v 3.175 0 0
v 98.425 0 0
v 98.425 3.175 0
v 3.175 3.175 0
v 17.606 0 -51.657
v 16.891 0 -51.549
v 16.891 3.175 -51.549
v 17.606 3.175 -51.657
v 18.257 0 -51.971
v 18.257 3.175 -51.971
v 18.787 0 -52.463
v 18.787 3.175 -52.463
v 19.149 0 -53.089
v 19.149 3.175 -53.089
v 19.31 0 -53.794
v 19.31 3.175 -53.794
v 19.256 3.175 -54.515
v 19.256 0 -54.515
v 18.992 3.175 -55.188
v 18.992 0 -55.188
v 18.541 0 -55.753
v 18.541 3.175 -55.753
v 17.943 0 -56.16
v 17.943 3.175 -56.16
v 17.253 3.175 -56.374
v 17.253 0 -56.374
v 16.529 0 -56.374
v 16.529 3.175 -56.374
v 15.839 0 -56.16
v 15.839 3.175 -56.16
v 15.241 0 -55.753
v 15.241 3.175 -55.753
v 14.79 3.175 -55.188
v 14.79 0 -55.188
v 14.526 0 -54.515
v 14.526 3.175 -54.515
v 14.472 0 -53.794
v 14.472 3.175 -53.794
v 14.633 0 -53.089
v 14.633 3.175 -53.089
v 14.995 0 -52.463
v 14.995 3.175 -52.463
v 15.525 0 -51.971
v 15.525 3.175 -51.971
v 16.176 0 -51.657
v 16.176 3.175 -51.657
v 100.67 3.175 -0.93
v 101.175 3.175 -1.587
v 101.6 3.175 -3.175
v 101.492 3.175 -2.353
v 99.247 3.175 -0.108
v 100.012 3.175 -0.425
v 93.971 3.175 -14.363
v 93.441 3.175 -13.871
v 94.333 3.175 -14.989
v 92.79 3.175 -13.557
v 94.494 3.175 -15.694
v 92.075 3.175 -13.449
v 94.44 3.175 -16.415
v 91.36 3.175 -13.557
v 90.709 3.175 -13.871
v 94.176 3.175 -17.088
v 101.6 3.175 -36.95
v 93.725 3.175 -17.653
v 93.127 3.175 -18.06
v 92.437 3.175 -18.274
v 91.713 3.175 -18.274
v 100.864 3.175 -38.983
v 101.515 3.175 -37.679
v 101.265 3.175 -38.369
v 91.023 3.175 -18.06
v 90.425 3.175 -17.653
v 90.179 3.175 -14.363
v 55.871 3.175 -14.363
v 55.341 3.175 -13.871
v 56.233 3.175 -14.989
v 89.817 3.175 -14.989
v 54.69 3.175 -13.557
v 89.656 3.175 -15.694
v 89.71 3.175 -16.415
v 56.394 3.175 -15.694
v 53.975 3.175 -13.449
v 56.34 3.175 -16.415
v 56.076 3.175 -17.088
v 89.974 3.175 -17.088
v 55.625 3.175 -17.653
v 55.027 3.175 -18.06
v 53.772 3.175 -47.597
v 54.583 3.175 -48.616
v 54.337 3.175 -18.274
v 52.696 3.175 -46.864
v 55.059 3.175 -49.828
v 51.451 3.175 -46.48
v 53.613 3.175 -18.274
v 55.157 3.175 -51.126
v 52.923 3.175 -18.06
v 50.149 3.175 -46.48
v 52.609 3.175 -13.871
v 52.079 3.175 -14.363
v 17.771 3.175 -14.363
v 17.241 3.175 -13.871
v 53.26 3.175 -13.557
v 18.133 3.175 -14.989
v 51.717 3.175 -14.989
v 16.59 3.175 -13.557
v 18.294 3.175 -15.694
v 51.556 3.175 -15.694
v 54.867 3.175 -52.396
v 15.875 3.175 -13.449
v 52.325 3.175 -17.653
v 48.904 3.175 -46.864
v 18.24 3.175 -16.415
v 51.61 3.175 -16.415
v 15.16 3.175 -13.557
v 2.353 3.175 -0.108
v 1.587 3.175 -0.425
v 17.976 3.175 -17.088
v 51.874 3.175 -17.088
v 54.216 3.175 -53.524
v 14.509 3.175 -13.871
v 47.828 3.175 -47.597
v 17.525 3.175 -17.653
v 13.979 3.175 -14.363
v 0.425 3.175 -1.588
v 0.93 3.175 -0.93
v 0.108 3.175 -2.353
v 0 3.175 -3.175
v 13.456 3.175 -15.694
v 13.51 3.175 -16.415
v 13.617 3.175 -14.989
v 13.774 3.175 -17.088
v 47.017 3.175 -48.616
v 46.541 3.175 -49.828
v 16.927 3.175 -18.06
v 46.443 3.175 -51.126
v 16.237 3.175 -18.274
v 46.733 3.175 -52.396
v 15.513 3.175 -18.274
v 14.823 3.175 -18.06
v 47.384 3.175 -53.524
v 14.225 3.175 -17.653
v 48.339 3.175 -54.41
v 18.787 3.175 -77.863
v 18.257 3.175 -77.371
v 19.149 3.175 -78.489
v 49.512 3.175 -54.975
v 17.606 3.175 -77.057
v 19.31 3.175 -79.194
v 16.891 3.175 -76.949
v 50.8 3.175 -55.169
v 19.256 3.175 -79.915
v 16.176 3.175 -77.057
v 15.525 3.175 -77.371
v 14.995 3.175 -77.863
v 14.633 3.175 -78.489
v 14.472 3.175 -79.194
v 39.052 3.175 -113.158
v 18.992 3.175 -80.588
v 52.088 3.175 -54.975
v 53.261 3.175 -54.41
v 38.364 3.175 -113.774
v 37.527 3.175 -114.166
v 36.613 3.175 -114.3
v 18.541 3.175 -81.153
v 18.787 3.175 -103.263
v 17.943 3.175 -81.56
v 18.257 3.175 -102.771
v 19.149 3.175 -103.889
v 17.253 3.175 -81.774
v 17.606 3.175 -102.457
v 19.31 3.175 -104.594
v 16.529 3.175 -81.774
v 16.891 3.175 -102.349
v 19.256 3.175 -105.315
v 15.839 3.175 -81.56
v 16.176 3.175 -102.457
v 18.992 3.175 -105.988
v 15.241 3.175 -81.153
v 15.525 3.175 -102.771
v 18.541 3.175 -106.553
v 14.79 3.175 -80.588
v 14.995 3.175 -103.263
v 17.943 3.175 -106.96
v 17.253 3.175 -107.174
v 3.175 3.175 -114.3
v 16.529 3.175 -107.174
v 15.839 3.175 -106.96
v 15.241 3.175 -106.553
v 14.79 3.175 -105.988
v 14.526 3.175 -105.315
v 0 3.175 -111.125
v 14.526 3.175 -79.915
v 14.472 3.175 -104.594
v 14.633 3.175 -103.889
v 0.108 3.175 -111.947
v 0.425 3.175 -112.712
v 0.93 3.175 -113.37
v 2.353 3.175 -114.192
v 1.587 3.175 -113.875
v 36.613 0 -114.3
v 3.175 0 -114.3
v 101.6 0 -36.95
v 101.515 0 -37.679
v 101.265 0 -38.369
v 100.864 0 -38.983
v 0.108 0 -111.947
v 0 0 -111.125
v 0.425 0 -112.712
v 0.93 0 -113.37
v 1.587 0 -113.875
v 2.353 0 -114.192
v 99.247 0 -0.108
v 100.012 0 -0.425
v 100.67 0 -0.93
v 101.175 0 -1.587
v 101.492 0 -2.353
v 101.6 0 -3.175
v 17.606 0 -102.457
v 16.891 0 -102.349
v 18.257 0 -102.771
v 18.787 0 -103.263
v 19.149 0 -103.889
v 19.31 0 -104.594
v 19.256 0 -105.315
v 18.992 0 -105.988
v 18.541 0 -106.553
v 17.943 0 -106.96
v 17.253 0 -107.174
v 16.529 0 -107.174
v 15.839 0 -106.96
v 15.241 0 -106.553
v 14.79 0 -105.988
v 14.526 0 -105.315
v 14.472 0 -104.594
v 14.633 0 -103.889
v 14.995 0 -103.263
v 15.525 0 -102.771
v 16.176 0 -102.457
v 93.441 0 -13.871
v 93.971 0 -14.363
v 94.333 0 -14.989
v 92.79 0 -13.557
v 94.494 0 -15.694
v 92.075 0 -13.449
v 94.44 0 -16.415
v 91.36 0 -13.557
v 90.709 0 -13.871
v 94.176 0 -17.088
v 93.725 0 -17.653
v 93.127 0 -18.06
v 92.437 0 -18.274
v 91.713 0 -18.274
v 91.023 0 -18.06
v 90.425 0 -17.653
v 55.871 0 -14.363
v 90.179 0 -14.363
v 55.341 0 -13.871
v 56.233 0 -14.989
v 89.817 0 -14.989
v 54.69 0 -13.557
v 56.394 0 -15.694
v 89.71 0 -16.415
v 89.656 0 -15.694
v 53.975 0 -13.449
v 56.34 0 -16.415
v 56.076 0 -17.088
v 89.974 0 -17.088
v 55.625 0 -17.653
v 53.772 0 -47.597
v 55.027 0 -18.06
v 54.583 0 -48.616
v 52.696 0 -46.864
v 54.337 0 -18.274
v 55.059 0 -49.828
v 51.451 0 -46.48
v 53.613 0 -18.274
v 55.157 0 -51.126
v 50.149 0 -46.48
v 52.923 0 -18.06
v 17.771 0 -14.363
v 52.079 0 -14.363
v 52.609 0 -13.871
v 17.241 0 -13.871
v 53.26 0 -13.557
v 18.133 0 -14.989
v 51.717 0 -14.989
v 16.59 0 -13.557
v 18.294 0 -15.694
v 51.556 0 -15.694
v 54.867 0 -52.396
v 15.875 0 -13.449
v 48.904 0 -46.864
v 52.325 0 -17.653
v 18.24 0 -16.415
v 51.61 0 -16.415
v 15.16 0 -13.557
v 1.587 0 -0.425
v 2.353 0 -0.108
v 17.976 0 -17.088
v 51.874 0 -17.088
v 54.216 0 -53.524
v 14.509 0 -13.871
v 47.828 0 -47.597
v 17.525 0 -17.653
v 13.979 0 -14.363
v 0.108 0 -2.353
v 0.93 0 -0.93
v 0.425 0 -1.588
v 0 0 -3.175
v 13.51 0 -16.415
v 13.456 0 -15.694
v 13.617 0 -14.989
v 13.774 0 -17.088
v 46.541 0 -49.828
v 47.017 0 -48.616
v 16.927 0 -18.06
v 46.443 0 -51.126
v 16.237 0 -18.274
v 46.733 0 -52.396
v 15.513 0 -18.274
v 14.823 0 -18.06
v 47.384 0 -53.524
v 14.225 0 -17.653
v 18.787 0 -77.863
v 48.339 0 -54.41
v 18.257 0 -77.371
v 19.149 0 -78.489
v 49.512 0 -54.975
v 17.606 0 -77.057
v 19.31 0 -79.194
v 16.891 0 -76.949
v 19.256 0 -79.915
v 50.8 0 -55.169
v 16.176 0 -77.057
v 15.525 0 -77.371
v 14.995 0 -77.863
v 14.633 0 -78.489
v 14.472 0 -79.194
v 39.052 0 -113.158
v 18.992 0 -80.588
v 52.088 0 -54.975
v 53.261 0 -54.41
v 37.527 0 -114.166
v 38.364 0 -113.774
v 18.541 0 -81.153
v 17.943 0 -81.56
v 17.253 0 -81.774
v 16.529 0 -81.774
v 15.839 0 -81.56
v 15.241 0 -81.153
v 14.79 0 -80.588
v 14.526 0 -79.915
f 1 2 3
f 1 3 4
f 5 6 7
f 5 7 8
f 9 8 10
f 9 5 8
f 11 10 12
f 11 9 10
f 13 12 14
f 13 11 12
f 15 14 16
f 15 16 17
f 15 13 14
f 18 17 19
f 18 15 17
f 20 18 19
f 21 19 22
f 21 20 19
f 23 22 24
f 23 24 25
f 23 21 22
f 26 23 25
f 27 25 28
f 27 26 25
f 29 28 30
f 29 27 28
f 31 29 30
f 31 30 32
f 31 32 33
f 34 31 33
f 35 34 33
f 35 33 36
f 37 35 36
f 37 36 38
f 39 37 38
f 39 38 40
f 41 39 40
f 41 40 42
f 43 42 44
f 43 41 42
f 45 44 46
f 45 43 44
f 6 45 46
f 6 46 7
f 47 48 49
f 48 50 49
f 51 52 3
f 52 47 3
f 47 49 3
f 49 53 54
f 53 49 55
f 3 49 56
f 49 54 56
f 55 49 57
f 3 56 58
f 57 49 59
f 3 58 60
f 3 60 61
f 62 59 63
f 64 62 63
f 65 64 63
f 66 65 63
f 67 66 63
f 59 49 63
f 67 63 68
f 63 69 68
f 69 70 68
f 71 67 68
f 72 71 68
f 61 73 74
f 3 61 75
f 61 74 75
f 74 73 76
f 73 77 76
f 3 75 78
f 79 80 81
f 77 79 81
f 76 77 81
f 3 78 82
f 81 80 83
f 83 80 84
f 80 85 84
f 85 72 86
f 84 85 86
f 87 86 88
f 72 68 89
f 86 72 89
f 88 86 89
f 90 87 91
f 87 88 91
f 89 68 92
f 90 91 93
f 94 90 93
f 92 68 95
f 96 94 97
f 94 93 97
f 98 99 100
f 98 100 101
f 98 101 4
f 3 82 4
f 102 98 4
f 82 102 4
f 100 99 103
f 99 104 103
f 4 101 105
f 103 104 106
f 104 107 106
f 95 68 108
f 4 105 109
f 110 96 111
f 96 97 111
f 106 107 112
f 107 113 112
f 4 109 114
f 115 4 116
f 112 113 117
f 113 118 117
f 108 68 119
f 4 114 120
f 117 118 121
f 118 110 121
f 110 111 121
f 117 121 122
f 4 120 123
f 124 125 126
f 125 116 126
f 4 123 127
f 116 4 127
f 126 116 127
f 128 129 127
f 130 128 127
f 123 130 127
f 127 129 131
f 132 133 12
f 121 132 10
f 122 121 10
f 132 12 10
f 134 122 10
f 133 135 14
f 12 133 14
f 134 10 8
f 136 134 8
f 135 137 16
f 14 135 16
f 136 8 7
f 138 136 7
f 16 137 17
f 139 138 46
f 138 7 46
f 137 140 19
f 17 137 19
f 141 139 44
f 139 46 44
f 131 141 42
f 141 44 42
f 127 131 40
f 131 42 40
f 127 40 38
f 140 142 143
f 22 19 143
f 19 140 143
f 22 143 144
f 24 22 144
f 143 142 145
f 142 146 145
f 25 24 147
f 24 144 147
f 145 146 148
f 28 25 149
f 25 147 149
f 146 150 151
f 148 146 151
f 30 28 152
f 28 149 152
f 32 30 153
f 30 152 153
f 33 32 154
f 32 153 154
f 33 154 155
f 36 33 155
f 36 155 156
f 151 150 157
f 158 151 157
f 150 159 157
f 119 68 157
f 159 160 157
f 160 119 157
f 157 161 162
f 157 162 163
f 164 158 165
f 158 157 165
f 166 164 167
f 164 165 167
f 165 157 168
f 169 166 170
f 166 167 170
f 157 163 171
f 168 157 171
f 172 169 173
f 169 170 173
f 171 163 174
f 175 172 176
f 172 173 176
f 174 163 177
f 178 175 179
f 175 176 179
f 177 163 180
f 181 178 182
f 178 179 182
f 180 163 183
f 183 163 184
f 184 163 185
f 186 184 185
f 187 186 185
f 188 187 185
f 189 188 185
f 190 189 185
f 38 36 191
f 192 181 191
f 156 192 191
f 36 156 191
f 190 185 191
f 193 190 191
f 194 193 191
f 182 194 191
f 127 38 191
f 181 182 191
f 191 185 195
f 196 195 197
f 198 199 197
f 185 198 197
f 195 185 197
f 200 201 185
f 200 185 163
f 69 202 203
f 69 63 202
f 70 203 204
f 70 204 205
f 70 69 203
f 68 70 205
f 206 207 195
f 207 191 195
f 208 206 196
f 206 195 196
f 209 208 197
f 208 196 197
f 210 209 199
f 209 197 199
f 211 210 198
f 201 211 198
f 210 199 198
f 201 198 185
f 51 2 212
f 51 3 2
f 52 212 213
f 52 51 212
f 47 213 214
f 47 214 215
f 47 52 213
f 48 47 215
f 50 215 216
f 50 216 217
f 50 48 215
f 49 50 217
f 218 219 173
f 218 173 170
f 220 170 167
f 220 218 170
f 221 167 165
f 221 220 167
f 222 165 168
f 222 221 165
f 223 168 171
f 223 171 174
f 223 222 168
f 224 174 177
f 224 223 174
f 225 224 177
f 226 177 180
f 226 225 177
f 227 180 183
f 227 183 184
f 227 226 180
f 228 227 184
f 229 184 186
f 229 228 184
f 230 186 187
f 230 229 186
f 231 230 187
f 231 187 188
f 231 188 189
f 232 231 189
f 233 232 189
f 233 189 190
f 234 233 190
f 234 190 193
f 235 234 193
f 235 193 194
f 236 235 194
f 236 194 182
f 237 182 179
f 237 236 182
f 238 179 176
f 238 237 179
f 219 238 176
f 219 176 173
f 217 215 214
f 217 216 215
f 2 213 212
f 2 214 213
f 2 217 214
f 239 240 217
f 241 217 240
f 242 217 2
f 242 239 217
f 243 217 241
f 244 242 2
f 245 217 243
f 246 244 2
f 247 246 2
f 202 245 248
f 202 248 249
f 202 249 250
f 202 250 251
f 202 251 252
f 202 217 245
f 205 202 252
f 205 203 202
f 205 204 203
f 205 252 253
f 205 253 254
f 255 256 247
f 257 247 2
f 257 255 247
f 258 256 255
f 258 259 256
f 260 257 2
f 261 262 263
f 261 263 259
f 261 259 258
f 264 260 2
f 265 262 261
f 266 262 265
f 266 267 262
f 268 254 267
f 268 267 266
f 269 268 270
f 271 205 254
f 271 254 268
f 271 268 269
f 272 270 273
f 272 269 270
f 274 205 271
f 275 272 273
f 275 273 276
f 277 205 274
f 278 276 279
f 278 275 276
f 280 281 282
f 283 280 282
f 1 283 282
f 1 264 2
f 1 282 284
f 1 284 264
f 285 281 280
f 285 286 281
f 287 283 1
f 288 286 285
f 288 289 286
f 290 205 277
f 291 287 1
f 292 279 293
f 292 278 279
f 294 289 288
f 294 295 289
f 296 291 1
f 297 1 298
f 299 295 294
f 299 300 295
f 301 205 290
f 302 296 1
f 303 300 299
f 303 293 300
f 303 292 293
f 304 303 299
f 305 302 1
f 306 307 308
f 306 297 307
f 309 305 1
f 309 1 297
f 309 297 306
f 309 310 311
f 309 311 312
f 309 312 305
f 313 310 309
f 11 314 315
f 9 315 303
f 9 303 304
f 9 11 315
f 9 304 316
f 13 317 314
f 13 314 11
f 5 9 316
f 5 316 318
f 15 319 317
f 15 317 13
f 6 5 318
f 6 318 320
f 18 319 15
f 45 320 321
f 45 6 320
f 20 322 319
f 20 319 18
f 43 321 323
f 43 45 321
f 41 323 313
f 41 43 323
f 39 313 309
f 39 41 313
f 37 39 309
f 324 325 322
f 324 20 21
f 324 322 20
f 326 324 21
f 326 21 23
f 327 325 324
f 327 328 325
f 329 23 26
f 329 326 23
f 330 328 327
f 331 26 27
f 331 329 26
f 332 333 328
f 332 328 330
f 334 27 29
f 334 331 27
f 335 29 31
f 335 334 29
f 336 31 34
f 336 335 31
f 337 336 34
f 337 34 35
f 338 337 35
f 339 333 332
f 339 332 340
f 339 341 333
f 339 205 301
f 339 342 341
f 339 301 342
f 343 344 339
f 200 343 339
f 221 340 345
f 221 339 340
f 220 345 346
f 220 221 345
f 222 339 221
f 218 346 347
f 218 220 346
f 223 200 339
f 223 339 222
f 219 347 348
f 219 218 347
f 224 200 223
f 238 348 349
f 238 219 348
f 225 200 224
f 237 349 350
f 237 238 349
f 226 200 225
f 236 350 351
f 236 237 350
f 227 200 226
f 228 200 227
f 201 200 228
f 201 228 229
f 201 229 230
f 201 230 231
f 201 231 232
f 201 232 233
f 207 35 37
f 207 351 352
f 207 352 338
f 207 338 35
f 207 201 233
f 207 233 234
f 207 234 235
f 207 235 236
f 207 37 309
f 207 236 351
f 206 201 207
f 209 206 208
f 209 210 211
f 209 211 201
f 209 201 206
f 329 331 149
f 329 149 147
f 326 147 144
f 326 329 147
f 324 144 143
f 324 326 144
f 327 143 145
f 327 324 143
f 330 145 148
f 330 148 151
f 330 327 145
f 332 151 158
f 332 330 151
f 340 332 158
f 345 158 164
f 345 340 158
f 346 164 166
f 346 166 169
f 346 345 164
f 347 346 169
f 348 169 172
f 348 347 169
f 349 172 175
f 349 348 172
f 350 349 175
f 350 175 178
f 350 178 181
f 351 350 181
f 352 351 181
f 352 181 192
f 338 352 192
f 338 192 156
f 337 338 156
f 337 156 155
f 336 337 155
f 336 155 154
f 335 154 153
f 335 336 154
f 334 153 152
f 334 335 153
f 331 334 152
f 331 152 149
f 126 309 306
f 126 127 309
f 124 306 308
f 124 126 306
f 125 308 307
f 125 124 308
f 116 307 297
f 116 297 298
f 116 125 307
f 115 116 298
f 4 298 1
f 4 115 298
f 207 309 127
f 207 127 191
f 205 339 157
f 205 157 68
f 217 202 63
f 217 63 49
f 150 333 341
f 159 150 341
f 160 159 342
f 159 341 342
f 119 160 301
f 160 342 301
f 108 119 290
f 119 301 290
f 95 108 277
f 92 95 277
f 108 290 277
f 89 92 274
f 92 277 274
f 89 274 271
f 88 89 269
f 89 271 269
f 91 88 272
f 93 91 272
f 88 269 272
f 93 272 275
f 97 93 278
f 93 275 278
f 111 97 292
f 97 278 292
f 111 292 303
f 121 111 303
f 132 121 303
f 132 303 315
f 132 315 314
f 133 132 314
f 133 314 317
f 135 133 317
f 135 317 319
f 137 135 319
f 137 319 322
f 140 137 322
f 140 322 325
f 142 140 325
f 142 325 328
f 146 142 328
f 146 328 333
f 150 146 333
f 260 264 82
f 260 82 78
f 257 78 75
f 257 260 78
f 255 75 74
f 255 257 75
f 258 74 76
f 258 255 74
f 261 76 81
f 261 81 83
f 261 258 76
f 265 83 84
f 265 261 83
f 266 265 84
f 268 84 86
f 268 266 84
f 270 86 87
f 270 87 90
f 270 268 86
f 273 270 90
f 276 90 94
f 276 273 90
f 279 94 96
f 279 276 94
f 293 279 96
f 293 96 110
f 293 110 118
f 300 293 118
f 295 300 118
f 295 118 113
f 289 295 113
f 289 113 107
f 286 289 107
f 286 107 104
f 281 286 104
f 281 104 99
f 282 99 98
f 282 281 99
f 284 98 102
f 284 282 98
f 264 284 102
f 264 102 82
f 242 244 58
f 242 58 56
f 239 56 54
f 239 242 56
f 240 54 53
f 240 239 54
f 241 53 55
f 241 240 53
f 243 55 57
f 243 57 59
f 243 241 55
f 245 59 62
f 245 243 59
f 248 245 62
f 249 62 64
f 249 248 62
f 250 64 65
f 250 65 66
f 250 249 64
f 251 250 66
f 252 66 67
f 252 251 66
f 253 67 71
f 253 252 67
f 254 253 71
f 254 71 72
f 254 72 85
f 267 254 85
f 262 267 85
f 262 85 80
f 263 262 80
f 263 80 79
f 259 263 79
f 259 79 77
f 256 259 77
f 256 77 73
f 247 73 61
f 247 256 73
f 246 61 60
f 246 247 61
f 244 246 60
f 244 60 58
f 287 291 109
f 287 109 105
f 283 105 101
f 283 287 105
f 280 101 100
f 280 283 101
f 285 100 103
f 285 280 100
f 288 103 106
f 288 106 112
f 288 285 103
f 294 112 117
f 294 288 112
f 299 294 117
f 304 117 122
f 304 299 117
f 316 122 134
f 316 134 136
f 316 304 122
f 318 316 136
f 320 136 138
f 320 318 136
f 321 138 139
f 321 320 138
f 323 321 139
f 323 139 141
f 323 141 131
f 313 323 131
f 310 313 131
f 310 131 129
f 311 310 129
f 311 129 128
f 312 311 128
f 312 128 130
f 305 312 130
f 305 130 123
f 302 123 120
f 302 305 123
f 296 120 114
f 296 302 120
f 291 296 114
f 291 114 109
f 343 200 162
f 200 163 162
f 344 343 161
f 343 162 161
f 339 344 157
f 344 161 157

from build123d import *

# Parameters (mm, degrees)
SKETCH1_R           = 2.4257
BOSS_EXTRUDE1_DEPTH = 3.175
FILLET1_R           = 3.175
SKETCH2_R           = 4.3688
CUT_EXTRUDE1_DEPTH  = 153.961206275


with BuildPart() as part:
    # Sketch1 → Boss-Extrude1 (new body)
    with BuildSketch(Plane(origin=(0, 0, 0), x_dir=(1, 0, 0), z_dir=(0, 1, 0))):
        Polygon((0, 0), (0, 114.3), (38.1, 114.3), (101.6, 38.1), (101.6, 0), align=None)
        with Locations(Location((15.875, 15.875, 0), (0, 0, 270))):
            Circle(SKETCH1_R, mode=Mode.SUBTRACT)
        with Locations(Location((53.975, 15.875, 0), (0, 0, 270))):
            Circle(SKETCH1_R, mode=Mode.SUBTRACT)
        with Locations(Location((92.075, 15.875, 0), (0, 0, 270))):
            Circle(SKETCH1_R, mode=Mode.SUBTRACT)
        with Locations(Location((16.891, 53.975, 0), (0, 0, 270))):
            Circle(SKETCH1_R, mode=Mode.SUBTRACT)
        with Locations(Location((16.891, 79.375, 0), (0, 0, 270))):
            Circle(SKETCH1_R, mode=Mode.SUBTRACT)
        with Locations(Location((16.891, 104.775, 0), (0, 0, 270))):
            Circle(SKETCH1_R, mode=Mode.SUBTRACT)
    extrude(amount=BOSS_EXTRUDE1_DEPTH)

    # Fillet1
    fillet1_edges = [part.edges().sort_by_distance(p)[0] for p in [
        (0, 1.5875, 0),
        (0, 1.5875, -114.3),
        (38.1, 1.5875, -114.3),
        (101.6, 1.5875, -38.1),
        (101.6, 1.5875, 0),
    ]]
    fillet(fillet1_edges, radius=FILLET1_R)

    # Sketch2 → Cut-Extrude1 (cut, through all)
    with BuildSketch(Plane.XZ):
        with Locations(Location((50.8, -50.8, 0), (0, 0, 270))):
            Circle(SKETCH2_R)
    extrude(amount=-CUT_EXTRUDE1_DEPTH, mode=Mode.SUBTRACT)


solid = part.part
